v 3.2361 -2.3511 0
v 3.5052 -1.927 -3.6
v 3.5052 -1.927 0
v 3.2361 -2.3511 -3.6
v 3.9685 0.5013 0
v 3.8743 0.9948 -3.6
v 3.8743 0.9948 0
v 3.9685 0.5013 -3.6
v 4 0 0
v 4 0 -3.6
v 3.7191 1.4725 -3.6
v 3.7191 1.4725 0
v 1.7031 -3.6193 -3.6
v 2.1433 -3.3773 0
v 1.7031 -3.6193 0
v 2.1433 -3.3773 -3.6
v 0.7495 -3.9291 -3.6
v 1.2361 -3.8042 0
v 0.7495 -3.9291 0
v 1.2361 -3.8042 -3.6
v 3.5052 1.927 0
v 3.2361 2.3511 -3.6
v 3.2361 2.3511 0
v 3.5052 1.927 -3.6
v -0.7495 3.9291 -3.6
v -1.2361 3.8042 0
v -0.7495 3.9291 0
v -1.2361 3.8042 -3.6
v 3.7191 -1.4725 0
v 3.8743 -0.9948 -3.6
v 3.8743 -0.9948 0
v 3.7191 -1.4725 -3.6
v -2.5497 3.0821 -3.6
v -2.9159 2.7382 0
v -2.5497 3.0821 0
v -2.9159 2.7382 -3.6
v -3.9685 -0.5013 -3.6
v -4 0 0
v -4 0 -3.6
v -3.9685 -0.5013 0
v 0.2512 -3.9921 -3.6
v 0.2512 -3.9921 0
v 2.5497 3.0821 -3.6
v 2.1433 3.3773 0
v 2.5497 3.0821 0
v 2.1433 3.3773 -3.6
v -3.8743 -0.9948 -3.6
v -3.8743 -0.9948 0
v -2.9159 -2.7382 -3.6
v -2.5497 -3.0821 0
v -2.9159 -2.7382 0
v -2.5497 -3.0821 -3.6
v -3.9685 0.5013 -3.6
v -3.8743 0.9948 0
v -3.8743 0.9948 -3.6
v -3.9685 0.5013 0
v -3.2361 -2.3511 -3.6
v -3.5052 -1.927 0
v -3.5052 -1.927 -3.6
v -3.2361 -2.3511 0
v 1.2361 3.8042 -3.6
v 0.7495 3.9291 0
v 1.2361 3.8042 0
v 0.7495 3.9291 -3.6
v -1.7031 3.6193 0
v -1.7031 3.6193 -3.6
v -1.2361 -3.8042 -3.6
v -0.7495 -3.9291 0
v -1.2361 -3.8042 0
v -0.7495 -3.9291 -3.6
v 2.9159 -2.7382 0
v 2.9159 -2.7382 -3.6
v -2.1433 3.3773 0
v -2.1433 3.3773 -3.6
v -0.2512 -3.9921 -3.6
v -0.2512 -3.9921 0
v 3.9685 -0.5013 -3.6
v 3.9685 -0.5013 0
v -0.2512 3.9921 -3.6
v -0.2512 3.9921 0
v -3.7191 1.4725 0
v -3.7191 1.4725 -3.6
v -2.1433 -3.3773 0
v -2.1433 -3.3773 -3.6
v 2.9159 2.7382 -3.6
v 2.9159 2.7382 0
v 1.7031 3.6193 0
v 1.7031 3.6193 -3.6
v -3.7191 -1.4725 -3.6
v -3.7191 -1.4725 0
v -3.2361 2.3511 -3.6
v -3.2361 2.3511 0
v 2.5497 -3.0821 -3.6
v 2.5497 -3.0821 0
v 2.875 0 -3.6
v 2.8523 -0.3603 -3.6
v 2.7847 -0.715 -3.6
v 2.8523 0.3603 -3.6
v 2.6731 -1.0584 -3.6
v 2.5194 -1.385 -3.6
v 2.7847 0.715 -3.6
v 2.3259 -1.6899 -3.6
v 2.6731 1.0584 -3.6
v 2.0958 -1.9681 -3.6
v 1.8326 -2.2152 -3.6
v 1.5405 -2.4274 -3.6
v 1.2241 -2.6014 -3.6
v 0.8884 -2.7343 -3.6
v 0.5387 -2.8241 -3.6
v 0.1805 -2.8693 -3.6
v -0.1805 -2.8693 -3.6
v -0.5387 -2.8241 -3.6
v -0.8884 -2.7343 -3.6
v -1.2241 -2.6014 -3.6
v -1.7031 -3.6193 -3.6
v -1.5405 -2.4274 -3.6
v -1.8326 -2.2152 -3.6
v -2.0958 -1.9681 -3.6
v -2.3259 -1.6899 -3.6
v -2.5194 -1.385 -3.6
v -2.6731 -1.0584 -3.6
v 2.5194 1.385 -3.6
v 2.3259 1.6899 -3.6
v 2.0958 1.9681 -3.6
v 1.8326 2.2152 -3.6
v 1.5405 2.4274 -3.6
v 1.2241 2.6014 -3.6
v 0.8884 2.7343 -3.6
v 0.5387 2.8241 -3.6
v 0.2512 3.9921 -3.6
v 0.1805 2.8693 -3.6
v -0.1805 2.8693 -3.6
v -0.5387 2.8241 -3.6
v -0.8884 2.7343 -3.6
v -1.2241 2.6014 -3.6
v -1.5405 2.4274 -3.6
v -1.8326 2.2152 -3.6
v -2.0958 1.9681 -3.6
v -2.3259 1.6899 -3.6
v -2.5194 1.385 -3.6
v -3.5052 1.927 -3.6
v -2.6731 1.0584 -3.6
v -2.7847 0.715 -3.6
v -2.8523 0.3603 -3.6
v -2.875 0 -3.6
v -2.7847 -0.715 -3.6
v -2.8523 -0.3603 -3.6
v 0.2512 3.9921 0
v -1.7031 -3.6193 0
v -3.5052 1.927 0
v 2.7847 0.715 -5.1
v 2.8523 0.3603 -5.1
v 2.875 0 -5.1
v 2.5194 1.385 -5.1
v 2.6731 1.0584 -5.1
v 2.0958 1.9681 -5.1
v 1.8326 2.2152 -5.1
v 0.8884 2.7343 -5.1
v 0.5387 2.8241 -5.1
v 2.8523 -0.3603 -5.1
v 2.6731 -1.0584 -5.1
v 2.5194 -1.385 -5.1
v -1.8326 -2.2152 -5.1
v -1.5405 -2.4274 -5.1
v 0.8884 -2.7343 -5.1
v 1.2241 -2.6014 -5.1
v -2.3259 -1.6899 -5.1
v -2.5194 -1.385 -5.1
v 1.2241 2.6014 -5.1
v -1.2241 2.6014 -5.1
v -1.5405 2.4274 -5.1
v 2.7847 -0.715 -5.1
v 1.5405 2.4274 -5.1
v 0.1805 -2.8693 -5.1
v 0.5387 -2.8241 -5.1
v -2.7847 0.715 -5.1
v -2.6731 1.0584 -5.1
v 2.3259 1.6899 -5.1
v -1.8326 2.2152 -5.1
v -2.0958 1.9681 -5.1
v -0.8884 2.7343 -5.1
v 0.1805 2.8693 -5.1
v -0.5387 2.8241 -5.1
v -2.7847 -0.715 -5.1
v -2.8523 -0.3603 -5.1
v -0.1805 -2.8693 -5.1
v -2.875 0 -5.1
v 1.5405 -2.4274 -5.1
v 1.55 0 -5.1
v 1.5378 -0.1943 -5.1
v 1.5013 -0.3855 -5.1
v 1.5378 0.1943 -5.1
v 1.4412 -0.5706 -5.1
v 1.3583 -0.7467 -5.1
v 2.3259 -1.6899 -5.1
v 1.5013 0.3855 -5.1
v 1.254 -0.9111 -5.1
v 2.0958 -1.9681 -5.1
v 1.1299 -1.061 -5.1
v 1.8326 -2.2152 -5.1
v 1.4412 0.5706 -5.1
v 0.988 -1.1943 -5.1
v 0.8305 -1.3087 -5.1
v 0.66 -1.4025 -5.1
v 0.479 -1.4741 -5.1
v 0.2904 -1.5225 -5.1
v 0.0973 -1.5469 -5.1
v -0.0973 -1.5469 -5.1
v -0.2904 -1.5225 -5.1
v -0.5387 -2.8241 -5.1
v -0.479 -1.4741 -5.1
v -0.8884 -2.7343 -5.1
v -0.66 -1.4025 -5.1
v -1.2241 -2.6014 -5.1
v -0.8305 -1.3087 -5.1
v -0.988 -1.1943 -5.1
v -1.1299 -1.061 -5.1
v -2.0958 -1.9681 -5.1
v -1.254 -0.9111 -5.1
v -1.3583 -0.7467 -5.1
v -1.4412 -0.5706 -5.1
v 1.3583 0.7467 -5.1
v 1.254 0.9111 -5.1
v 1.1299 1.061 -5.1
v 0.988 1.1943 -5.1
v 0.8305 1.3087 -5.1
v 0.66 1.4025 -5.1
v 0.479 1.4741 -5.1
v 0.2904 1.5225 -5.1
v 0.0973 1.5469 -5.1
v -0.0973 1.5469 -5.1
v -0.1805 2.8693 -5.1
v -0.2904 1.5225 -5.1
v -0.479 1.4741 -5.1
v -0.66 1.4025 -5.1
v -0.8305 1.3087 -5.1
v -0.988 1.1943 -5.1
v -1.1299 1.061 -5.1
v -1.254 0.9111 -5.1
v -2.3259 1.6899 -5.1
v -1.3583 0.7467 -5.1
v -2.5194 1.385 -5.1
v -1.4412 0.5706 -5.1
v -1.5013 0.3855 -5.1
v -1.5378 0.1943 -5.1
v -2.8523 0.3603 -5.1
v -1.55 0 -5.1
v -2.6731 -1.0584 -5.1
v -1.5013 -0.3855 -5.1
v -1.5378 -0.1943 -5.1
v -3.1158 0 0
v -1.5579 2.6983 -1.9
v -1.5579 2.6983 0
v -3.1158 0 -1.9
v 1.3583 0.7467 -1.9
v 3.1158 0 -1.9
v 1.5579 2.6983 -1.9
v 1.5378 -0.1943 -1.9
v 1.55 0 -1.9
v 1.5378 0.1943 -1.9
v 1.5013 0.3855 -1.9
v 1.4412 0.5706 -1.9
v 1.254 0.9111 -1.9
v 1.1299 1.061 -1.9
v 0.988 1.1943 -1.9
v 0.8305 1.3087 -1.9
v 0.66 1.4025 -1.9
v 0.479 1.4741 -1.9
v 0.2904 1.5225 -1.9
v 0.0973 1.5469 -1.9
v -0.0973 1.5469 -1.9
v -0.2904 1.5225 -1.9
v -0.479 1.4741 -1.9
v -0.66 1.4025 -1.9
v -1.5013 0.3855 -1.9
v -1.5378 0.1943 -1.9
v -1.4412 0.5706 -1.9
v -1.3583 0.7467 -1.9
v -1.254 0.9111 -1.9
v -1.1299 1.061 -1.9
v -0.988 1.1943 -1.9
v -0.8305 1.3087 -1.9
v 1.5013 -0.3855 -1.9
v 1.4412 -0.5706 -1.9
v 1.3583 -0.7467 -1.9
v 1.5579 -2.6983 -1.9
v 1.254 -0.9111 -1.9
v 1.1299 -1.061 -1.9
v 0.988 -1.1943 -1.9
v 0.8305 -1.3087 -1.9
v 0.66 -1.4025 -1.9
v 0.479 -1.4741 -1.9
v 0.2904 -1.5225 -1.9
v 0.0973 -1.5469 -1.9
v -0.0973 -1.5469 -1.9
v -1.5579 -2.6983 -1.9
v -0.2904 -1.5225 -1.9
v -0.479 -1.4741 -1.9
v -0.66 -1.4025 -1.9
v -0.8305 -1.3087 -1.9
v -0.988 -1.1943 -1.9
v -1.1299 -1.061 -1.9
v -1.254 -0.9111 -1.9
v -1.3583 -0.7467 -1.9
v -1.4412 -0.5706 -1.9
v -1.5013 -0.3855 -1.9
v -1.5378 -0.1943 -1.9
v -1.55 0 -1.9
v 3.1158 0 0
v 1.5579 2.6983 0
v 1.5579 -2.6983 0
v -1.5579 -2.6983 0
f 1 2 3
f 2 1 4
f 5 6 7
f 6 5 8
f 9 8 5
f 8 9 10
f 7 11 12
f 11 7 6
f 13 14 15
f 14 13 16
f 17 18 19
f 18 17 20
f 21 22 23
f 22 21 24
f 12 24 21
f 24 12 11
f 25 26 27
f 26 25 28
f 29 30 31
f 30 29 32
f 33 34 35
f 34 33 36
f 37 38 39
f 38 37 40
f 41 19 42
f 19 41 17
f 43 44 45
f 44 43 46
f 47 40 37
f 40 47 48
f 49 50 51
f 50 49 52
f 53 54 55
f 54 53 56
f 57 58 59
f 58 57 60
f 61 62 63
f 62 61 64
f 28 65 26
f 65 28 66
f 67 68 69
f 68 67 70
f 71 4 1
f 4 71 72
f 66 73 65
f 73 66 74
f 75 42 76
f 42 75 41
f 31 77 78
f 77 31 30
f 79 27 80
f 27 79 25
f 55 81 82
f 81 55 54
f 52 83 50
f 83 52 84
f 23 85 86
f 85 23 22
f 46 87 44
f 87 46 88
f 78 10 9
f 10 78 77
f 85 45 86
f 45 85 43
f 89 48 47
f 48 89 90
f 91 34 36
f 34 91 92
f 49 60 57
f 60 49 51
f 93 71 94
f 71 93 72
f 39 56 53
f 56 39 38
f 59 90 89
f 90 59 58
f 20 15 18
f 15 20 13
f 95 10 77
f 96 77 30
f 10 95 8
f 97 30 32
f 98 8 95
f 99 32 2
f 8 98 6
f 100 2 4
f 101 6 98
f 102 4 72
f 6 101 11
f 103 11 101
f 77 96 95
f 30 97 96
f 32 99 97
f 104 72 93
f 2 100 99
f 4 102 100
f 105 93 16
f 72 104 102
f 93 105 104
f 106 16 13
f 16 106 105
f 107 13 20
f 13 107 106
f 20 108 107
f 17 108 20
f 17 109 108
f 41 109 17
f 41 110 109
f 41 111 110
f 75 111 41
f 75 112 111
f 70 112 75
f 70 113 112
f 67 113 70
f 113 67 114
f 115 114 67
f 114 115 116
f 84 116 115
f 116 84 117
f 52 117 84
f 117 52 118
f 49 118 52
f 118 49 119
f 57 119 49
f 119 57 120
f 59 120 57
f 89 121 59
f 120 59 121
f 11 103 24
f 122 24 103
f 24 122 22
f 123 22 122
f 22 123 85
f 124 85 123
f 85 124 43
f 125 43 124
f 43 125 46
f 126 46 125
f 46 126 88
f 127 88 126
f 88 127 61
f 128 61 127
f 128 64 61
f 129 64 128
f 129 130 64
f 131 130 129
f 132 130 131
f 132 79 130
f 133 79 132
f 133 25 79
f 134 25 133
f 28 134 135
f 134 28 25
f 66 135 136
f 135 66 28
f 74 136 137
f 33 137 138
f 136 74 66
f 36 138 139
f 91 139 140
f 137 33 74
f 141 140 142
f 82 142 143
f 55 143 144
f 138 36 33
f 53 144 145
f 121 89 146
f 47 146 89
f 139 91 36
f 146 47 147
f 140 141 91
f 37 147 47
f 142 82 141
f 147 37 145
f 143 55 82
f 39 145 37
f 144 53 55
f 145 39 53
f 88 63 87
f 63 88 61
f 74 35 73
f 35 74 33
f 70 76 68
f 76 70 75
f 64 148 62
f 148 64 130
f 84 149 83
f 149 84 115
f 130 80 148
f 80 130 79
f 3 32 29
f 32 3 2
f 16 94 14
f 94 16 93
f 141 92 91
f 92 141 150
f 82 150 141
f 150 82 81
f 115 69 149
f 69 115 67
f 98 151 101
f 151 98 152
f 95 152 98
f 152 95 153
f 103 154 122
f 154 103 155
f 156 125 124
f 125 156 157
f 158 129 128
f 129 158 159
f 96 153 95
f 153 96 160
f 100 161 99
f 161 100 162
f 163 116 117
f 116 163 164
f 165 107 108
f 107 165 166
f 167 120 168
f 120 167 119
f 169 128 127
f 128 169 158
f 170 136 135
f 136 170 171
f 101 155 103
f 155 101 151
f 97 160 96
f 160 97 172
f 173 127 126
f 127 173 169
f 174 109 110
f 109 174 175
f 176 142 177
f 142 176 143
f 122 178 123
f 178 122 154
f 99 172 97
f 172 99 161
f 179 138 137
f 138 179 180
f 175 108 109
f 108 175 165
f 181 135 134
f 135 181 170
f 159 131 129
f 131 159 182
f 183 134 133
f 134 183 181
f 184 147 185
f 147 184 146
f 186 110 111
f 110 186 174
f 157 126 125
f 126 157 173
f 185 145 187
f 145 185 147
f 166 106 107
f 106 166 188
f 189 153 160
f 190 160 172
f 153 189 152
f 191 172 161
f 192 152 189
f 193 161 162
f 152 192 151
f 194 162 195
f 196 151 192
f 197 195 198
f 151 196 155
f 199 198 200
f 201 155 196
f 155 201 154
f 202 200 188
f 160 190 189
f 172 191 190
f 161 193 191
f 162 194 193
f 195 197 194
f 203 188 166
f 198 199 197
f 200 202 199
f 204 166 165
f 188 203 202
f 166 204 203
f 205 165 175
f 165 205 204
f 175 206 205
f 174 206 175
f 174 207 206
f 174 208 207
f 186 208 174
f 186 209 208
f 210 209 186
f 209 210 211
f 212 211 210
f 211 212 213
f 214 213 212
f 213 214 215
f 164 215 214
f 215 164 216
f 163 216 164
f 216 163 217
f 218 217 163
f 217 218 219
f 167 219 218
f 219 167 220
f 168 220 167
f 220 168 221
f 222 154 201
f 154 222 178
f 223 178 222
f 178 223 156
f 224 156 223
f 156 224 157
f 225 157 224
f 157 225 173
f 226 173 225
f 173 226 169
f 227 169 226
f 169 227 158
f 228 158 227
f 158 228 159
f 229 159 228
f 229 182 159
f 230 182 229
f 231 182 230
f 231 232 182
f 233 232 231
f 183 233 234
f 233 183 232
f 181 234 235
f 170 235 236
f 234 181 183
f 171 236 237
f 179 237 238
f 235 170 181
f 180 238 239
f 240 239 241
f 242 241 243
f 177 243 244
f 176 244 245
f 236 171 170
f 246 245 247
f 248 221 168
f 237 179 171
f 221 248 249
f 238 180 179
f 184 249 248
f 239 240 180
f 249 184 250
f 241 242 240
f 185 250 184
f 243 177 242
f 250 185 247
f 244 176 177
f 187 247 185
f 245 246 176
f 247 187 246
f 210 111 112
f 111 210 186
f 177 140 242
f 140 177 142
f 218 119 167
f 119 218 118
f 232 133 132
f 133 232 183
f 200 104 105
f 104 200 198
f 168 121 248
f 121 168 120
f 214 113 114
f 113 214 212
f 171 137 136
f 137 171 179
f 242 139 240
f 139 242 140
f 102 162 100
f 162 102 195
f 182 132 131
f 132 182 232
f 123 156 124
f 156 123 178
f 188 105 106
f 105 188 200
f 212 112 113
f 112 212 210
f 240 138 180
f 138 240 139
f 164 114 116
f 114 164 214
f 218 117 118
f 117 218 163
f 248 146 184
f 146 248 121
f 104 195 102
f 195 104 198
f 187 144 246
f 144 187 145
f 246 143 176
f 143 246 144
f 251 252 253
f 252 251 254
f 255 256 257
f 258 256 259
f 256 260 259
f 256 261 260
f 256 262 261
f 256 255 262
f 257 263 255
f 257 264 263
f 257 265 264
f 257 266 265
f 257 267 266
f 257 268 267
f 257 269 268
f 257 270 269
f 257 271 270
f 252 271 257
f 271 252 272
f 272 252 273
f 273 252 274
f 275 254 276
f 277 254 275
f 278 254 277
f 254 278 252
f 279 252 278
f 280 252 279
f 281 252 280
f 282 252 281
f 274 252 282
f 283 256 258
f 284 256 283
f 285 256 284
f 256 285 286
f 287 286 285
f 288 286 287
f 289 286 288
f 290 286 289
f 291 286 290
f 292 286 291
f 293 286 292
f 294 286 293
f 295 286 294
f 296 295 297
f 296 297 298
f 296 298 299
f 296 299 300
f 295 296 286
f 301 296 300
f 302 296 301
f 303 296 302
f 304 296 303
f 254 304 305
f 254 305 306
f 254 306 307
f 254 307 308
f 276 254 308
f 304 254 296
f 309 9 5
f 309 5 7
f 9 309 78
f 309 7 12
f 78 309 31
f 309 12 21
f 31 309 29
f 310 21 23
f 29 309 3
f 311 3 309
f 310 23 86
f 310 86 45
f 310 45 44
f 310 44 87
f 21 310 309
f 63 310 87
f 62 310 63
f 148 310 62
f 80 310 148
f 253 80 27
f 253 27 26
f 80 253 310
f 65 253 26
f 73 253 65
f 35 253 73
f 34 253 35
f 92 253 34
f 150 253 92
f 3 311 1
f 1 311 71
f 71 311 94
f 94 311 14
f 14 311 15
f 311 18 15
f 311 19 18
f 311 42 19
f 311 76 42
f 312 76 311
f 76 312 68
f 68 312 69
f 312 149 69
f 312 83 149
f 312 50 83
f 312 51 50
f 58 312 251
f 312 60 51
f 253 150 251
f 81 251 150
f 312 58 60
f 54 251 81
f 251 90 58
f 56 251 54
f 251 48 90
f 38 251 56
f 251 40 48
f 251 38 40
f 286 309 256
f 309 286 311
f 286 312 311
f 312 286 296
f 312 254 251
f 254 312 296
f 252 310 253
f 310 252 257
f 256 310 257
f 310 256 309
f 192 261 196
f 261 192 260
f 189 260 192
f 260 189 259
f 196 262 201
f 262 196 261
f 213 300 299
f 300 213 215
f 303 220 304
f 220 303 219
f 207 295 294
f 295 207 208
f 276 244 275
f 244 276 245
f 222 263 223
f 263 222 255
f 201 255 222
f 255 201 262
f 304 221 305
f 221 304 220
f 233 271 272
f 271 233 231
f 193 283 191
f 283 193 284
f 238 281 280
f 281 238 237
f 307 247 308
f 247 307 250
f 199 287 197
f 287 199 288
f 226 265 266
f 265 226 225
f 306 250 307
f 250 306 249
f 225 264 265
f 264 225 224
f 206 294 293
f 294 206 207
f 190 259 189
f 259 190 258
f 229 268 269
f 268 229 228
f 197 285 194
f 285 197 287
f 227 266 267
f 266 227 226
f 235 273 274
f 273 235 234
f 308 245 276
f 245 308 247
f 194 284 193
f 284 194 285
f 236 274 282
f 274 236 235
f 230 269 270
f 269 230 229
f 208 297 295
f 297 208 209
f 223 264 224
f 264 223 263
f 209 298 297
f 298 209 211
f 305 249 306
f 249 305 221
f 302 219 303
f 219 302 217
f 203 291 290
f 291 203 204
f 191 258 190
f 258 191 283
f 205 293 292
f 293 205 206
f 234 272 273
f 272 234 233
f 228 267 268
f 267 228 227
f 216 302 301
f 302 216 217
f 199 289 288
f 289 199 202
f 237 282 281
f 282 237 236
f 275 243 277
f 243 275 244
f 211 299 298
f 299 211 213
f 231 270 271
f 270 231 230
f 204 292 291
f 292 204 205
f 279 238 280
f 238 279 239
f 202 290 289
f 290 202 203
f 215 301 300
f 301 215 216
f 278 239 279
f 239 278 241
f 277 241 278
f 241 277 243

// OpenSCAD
$fn = 50;

difference() {
	union() {
		translate(v = [0, 0, -3.5999999999999996]) {
			cylinder(h = 6.6, r = 4.0);
		}
		#translate(v = [0, 0, -5.1]) {
			cylinder(h = 5.1, r = 2.875);
		}
	}
	union() {
		translate(v = [0, 0, 0]) {
			rotate(a = [0, 0, 0]) {
				difference() {
					union() {
						translate(v = [0, 0, -1.9]) {
							linear_extrude(height = 1.9) {
								polygon(points = [[3.1158, 0.0], [1.5579000000000005, 2.698361953111554], [-1.5578999999999994, 2.6983619531115544], [-3.1158, 3.815754496783323e-16], [-1.5579000000000014, -2.6983619531115535], [1.557899999999998, -2.6983619531115552]]);
							}
						}
					}
					union();
				}
			}
		}
		#cylinder(h = 3, r = 5.0);
		#translate(v = [0, 0, -100.0]) {
			cylinder(h = 200, r = 1.55);
		}
	}
}
